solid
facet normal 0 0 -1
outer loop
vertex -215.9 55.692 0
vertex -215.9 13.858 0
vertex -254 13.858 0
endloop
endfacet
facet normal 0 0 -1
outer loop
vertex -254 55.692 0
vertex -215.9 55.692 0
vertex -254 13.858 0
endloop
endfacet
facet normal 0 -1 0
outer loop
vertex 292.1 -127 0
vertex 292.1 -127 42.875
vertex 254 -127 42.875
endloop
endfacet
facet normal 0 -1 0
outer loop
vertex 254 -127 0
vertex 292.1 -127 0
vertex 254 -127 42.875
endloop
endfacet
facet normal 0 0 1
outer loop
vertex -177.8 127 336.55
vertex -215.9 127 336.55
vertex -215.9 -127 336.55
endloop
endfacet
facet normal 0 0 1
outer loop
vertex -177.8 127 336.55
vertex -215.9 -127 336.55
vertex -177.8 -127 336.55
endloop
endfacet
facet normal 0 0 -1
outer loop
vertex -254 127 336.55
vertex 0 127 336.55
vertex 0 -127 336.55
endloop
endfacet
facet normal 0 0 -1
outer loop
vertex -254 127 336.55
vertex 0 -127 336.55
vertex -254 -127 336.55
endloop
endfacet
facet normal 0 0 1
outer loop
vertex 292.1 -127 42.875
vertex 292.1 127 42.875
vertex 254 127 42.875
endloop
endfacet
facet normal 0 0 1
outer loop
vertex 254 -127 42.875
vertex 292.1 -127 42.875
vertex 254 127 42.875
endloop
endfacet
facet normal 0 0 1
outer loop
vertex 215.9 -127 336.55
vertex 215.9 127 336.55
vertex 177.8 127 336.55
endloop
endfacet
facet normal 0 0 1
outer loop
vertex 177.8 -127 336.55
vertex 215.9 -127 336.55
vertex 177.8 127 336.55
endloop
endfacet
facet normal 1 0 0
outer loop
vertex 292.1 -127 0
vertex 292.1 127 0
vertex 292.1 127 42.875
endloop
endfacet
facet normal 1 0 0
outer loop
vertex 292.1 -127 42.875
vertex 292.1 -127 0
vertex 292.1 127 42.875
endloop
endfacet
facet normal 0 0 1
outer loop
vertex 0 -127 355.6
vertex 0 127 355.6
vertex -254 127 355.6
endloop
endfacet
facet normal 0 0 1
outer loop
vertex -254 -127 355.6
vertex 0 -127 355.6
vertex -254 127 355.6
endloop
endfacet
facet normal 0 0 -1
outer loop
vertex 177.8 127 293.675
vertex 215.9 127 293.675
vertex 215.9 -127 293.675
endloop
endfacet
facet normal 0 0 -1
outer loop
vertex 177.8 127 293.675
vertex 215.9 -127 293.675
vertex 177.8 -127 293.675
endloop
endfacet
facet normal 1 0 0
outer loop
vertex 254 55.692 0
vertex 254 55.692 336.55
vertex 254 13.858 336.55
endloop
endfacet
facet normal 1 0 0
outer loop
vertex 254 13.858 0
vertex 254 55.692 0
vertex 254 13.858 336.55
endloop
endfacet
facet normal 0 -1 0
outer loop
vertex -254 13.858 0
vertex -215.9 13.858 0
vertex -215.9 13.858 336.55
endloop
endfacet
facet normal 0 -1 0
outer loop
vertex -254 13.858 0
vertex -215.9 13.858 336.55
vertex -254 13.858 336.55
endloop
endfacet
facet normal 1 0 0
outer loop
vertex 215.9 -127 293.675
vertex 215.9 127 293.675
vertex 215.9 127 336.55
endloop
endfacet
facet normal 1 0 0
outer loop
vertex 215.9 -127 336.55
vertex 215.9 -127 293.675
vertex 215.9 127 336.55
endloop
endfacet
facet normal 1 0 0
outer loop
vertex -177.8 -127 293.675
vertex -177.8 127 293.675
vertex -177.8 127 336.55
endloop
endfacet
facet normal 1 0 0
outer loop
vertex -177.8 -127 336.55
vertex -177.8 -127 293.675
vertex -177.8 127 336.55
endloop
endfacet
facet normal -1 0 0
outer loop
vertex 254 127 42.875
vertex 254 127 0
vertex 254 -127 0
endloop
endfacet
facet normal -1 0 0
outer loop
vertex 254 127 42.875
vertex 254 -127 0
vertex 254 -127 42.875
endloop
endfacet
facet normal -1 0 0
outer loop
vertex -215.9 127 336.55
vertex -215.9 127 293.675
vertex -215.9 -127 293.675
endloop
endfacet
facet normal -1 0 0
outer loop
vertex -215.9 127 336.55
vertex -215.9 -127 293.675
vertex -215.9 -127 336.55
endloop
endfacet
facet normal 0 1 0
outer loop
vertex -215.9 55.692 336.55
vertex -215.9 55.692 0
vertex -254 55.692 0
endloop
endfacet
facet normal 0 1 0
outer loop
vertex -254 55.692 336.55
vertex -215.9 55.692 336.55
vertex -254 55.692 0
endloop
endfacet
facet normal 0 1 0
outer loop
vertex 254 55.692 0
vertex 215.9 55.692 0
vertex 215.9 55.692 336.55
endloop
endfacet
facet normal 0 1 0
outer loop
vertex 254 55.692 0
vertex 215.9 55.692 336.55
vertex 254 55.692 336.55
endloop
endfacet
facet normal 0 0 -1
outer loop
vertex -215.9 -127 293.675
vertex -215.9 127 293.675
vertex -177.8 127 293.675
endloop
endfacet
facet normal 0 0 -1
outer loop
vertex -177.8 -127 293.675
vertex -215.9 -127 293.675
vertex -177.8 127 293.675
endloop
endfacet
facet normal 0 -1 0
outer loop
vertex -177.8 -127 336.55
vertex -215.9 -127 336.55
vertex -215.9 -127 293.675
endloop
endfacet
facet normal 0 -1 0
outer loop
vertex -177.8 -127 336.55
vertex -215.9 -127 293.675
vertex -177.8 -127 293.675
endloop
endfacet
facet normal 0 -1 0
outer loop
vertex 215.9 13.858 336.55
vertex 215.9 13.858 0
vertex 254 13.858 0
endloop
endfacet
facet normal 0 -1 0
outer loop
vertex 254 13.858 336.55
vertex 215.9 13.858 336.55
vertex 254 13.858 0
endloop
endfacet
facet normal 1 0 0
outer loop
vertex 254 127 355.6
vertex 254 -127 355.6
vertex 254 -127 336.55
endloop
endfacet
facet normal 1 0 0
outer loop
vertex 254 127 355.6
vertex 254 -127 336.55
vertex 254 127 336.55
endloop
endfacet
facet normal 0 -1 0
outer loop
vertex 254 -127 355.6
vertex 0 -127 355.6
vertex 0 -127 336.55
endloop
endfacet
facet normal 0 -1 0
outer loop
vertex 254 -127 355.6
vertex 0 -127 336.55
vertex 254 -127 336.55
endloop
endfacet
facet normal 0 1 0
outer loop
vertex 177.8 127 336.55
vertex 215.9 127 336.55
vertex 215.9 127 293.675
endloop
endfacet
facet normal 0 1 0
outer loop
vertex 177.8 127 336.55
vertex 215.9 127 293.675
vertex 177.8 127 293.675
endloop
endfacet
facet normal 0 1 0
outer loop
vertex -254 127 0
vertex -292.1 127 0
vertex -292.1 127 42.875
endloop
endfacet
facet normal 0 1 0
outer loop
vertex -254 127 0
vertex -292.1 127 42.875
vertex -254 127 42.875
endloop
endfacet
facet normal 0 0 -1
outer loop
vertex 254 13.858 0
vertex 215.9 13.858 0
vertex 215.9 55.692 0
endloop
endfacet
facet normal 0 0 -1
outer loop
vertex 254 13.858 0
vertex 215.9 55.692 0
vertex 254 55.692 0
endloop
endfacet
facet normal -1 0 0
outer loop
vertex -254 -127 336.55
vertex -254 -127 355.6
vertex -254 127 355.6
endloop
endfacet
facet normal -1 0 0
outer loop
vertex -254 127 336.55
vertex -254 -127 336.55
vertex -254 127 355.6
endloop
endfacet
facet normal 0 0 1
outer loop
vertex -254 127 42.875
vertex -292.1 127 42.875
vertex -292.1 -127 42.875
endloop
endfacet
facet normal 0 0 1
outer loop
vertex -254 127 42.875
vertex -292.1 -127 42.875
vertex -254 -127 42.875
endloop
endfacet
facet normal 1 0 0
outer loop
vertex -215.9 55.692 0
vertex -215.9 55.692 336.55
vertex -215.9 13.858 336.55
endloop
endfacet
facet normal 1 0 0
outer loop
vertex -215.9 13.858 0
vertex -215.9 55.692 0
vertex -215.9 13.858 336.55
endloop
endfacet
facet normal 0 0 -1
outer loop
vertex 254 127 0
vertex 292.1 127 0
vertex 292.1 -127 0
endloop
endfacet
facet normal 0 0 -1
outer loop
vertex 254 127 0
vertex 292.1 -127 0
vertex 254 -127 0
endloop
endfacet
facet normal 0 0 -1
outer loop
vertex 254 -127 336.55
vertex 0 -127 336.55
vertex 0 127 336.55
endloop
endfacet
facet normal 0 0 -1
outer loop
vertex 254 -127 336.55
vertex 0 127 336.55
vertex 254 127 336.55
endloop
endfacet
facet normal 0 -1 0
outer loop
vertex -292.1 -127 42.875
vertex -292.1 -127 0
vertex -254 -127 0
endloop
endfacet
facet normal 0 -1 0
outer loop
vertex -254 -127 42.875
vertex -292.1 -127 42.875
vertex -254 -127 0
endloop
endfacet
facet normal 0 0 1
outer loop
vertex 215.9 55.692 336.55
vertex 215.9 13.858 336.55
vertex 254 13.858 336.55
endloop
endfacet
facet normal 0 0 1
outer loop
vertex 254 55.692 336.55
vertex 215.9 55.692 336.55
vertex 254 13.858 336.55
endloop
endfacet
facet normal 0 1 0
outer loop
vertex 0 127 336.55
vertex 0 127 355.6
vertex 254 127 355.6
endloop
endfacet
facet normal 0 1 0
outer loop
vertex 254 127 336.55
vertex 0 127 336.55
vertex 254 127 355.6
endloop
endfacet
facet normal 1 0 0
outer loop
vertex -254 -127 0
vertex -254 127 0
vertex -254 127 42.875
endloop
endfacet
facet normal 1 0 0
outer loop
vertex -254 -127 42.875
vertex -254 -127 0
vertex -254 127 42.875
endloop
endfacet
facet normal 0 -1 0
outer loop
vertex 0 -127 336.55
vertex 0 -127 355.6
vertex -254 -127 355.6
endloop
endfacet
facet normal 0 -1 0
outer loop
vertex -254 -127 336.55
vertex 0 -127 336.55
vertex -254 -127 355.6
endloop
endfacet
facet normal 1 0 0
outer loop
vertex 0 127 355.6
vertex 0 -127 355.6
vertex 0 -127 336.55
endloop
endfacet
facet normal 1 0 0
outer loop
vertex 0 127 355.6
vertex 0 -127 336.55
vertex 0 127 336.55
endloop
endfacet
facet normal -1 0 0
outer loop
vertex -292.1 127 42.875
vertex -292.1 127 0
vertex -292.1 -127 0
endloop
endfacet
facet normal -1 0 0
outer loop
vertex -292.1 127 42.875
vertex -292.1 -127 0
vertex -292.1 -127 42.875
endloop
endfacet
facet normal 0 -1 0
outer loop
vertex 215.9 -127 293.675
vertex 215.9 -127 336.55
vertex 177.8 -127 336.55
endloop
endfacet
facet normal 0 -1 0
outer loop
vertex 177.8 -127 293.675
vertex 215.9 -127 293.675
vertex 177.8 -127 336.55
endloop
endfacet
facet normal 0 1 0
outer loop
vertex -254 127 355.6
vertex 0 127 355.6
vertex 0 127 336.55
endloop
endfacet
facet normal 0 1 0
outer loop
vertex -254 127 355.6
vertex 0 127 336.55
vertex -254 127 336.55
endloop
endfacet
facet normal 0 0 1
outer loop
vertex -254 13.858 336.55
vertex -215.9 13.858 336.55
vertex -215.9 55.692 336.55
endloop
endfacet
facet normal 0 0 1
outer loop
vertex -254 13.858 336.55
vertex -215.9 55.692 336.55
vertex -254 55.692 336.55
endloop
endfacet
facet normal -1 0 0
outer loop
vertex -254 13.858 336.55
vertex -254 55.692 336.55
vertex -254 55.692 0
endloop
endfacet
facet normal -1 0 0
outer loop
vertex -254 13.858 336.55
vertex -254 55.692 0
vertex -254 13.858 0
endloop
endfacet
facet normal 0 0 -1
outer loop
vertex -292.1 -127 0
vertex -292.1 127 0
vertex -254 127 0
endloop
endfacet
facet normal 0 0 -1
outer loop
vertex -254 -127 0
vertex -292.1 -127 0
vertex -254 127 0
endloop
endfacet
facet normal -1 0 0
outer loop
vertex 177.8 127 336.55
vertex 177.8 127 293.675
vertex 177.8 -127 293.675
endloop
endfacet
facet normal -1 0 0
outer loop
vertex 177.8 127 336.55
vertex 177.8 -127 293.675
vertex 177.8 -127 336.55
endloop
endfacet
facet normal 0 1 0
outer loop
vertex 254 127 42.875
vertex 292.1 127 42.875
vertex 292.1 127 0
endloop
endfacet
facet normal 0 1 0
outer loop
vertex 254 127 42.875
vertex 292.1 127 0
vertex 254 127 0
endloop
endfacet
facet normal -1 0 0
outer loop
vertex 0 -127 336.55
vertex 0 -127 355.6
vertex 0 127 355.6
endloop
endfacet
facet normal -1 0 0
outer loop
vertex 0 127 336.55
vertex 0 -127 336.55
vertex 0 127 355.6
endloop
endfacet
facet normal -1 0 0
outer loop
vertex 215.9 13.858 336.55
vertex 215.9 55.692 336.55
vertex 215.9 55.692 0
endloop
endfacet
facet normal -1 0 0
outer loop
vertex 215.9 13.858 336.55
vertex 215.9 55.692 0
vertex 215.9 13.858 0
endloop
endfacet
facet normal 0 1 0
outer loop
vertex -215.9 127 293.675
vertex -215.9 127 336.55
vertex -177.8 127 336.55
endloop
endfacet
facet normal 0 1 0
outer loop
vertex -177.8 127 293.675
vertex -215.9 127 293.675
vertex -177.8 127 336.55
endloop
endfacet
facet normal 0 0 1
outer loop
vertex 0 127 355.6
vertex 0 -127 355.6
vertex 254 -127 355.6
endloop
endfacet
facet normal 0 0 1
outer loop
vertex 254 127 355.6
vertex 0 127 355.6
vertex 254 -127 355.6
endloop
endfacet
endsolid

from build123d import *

# Parameters (mm, degrees)
F2_W      = 254
F2_H      = 254
F3_DEPTH  = 19.05
F4_DEPTH  = 19.05
F5_W      = 38.1
F5_H      = 41.833972
F6_DEPTH  = 336.55
F7_W      = 38.1
F7_H      = 42.8752
F8_DEPTH  = 254
F9_W      = 38.1
F9_H      = 42.8752
F10_DEPTH = 254


with BuildPart() as f3:
    # F2 (on plane+point) → F3 (new body)
    with BuildSketch(Plane.XY.offset(355.6)):
        with Locations((127, 0)):
            Rectangle(F2_W, F2_H)
    extrude(amount=-F3_DEPTH)

    # F2 (on plane+point) → F4 (join)
    with BuildSketch(Plane.XY.offset(355.6)):
        with Locations((127, 0)):
            Rectangle(F2_W, F2_H)
    extrude(amount=-F4_DEPTH)


with BuildPart() as f6:
    # F5 (on face) → F6 (new body, through all)
    with BuildSketch(Plane(origin=(0, 0, 336.55), x_dir=(1, 0, 0), z_dir=(0, 0, -1))):
        with Locations((234.95, -34.775032)):
            Rectangle(F5_W, F5_H)
    extrude(amount=F6_DEPTH)


with BuildPart() as f8:
    # F7 (on face) → F8 (new body, through all)
    with BuildSketch(Plane(origin=(0, 127, 0), x_dir=(-1, 0, 0), z_dir=(0, 1, 0))):
        with Locations((-196.85, 315.1124)):
            Rectangle(F7_W, F7_H)
    extrude(amount=-F8_DEPTH)


with BuildPart() as f10:
    # F9 (on face) → F10 (new body, through all)
    with BuildSketch(Plane(origin=(0, 127, 0), x_dir=(-1, 0, 0), z_dir=(0, 1, 0))):
        with Locations((-273.05, 21.4376)):
            Rectangle(F9_W, F9_H)
    extrude(amount=-F10_DEPTH)


with BuildPart() as f11_1:
    # F11: instance of F3
    add(f3.part.mirror(Plane.YZ))


with BuildPart() as f11_2:
    # F11: instance of F6
    add(f6.part.mirror(Plane.YZ))


with BuildPart() as f11_3:
    # F11: instance of F8
    add(f8.part.mirror(Plane.YZ))


with BuildPart() as f11_4:
    # F11: instance of F10
    add(f10.part.mirror(Plane.YZ))


solid = Compound([f3.part, f6.part, f8.part, f10.part, f11_1.part, f11_2.part, f11_3.part, f11_4.part])
